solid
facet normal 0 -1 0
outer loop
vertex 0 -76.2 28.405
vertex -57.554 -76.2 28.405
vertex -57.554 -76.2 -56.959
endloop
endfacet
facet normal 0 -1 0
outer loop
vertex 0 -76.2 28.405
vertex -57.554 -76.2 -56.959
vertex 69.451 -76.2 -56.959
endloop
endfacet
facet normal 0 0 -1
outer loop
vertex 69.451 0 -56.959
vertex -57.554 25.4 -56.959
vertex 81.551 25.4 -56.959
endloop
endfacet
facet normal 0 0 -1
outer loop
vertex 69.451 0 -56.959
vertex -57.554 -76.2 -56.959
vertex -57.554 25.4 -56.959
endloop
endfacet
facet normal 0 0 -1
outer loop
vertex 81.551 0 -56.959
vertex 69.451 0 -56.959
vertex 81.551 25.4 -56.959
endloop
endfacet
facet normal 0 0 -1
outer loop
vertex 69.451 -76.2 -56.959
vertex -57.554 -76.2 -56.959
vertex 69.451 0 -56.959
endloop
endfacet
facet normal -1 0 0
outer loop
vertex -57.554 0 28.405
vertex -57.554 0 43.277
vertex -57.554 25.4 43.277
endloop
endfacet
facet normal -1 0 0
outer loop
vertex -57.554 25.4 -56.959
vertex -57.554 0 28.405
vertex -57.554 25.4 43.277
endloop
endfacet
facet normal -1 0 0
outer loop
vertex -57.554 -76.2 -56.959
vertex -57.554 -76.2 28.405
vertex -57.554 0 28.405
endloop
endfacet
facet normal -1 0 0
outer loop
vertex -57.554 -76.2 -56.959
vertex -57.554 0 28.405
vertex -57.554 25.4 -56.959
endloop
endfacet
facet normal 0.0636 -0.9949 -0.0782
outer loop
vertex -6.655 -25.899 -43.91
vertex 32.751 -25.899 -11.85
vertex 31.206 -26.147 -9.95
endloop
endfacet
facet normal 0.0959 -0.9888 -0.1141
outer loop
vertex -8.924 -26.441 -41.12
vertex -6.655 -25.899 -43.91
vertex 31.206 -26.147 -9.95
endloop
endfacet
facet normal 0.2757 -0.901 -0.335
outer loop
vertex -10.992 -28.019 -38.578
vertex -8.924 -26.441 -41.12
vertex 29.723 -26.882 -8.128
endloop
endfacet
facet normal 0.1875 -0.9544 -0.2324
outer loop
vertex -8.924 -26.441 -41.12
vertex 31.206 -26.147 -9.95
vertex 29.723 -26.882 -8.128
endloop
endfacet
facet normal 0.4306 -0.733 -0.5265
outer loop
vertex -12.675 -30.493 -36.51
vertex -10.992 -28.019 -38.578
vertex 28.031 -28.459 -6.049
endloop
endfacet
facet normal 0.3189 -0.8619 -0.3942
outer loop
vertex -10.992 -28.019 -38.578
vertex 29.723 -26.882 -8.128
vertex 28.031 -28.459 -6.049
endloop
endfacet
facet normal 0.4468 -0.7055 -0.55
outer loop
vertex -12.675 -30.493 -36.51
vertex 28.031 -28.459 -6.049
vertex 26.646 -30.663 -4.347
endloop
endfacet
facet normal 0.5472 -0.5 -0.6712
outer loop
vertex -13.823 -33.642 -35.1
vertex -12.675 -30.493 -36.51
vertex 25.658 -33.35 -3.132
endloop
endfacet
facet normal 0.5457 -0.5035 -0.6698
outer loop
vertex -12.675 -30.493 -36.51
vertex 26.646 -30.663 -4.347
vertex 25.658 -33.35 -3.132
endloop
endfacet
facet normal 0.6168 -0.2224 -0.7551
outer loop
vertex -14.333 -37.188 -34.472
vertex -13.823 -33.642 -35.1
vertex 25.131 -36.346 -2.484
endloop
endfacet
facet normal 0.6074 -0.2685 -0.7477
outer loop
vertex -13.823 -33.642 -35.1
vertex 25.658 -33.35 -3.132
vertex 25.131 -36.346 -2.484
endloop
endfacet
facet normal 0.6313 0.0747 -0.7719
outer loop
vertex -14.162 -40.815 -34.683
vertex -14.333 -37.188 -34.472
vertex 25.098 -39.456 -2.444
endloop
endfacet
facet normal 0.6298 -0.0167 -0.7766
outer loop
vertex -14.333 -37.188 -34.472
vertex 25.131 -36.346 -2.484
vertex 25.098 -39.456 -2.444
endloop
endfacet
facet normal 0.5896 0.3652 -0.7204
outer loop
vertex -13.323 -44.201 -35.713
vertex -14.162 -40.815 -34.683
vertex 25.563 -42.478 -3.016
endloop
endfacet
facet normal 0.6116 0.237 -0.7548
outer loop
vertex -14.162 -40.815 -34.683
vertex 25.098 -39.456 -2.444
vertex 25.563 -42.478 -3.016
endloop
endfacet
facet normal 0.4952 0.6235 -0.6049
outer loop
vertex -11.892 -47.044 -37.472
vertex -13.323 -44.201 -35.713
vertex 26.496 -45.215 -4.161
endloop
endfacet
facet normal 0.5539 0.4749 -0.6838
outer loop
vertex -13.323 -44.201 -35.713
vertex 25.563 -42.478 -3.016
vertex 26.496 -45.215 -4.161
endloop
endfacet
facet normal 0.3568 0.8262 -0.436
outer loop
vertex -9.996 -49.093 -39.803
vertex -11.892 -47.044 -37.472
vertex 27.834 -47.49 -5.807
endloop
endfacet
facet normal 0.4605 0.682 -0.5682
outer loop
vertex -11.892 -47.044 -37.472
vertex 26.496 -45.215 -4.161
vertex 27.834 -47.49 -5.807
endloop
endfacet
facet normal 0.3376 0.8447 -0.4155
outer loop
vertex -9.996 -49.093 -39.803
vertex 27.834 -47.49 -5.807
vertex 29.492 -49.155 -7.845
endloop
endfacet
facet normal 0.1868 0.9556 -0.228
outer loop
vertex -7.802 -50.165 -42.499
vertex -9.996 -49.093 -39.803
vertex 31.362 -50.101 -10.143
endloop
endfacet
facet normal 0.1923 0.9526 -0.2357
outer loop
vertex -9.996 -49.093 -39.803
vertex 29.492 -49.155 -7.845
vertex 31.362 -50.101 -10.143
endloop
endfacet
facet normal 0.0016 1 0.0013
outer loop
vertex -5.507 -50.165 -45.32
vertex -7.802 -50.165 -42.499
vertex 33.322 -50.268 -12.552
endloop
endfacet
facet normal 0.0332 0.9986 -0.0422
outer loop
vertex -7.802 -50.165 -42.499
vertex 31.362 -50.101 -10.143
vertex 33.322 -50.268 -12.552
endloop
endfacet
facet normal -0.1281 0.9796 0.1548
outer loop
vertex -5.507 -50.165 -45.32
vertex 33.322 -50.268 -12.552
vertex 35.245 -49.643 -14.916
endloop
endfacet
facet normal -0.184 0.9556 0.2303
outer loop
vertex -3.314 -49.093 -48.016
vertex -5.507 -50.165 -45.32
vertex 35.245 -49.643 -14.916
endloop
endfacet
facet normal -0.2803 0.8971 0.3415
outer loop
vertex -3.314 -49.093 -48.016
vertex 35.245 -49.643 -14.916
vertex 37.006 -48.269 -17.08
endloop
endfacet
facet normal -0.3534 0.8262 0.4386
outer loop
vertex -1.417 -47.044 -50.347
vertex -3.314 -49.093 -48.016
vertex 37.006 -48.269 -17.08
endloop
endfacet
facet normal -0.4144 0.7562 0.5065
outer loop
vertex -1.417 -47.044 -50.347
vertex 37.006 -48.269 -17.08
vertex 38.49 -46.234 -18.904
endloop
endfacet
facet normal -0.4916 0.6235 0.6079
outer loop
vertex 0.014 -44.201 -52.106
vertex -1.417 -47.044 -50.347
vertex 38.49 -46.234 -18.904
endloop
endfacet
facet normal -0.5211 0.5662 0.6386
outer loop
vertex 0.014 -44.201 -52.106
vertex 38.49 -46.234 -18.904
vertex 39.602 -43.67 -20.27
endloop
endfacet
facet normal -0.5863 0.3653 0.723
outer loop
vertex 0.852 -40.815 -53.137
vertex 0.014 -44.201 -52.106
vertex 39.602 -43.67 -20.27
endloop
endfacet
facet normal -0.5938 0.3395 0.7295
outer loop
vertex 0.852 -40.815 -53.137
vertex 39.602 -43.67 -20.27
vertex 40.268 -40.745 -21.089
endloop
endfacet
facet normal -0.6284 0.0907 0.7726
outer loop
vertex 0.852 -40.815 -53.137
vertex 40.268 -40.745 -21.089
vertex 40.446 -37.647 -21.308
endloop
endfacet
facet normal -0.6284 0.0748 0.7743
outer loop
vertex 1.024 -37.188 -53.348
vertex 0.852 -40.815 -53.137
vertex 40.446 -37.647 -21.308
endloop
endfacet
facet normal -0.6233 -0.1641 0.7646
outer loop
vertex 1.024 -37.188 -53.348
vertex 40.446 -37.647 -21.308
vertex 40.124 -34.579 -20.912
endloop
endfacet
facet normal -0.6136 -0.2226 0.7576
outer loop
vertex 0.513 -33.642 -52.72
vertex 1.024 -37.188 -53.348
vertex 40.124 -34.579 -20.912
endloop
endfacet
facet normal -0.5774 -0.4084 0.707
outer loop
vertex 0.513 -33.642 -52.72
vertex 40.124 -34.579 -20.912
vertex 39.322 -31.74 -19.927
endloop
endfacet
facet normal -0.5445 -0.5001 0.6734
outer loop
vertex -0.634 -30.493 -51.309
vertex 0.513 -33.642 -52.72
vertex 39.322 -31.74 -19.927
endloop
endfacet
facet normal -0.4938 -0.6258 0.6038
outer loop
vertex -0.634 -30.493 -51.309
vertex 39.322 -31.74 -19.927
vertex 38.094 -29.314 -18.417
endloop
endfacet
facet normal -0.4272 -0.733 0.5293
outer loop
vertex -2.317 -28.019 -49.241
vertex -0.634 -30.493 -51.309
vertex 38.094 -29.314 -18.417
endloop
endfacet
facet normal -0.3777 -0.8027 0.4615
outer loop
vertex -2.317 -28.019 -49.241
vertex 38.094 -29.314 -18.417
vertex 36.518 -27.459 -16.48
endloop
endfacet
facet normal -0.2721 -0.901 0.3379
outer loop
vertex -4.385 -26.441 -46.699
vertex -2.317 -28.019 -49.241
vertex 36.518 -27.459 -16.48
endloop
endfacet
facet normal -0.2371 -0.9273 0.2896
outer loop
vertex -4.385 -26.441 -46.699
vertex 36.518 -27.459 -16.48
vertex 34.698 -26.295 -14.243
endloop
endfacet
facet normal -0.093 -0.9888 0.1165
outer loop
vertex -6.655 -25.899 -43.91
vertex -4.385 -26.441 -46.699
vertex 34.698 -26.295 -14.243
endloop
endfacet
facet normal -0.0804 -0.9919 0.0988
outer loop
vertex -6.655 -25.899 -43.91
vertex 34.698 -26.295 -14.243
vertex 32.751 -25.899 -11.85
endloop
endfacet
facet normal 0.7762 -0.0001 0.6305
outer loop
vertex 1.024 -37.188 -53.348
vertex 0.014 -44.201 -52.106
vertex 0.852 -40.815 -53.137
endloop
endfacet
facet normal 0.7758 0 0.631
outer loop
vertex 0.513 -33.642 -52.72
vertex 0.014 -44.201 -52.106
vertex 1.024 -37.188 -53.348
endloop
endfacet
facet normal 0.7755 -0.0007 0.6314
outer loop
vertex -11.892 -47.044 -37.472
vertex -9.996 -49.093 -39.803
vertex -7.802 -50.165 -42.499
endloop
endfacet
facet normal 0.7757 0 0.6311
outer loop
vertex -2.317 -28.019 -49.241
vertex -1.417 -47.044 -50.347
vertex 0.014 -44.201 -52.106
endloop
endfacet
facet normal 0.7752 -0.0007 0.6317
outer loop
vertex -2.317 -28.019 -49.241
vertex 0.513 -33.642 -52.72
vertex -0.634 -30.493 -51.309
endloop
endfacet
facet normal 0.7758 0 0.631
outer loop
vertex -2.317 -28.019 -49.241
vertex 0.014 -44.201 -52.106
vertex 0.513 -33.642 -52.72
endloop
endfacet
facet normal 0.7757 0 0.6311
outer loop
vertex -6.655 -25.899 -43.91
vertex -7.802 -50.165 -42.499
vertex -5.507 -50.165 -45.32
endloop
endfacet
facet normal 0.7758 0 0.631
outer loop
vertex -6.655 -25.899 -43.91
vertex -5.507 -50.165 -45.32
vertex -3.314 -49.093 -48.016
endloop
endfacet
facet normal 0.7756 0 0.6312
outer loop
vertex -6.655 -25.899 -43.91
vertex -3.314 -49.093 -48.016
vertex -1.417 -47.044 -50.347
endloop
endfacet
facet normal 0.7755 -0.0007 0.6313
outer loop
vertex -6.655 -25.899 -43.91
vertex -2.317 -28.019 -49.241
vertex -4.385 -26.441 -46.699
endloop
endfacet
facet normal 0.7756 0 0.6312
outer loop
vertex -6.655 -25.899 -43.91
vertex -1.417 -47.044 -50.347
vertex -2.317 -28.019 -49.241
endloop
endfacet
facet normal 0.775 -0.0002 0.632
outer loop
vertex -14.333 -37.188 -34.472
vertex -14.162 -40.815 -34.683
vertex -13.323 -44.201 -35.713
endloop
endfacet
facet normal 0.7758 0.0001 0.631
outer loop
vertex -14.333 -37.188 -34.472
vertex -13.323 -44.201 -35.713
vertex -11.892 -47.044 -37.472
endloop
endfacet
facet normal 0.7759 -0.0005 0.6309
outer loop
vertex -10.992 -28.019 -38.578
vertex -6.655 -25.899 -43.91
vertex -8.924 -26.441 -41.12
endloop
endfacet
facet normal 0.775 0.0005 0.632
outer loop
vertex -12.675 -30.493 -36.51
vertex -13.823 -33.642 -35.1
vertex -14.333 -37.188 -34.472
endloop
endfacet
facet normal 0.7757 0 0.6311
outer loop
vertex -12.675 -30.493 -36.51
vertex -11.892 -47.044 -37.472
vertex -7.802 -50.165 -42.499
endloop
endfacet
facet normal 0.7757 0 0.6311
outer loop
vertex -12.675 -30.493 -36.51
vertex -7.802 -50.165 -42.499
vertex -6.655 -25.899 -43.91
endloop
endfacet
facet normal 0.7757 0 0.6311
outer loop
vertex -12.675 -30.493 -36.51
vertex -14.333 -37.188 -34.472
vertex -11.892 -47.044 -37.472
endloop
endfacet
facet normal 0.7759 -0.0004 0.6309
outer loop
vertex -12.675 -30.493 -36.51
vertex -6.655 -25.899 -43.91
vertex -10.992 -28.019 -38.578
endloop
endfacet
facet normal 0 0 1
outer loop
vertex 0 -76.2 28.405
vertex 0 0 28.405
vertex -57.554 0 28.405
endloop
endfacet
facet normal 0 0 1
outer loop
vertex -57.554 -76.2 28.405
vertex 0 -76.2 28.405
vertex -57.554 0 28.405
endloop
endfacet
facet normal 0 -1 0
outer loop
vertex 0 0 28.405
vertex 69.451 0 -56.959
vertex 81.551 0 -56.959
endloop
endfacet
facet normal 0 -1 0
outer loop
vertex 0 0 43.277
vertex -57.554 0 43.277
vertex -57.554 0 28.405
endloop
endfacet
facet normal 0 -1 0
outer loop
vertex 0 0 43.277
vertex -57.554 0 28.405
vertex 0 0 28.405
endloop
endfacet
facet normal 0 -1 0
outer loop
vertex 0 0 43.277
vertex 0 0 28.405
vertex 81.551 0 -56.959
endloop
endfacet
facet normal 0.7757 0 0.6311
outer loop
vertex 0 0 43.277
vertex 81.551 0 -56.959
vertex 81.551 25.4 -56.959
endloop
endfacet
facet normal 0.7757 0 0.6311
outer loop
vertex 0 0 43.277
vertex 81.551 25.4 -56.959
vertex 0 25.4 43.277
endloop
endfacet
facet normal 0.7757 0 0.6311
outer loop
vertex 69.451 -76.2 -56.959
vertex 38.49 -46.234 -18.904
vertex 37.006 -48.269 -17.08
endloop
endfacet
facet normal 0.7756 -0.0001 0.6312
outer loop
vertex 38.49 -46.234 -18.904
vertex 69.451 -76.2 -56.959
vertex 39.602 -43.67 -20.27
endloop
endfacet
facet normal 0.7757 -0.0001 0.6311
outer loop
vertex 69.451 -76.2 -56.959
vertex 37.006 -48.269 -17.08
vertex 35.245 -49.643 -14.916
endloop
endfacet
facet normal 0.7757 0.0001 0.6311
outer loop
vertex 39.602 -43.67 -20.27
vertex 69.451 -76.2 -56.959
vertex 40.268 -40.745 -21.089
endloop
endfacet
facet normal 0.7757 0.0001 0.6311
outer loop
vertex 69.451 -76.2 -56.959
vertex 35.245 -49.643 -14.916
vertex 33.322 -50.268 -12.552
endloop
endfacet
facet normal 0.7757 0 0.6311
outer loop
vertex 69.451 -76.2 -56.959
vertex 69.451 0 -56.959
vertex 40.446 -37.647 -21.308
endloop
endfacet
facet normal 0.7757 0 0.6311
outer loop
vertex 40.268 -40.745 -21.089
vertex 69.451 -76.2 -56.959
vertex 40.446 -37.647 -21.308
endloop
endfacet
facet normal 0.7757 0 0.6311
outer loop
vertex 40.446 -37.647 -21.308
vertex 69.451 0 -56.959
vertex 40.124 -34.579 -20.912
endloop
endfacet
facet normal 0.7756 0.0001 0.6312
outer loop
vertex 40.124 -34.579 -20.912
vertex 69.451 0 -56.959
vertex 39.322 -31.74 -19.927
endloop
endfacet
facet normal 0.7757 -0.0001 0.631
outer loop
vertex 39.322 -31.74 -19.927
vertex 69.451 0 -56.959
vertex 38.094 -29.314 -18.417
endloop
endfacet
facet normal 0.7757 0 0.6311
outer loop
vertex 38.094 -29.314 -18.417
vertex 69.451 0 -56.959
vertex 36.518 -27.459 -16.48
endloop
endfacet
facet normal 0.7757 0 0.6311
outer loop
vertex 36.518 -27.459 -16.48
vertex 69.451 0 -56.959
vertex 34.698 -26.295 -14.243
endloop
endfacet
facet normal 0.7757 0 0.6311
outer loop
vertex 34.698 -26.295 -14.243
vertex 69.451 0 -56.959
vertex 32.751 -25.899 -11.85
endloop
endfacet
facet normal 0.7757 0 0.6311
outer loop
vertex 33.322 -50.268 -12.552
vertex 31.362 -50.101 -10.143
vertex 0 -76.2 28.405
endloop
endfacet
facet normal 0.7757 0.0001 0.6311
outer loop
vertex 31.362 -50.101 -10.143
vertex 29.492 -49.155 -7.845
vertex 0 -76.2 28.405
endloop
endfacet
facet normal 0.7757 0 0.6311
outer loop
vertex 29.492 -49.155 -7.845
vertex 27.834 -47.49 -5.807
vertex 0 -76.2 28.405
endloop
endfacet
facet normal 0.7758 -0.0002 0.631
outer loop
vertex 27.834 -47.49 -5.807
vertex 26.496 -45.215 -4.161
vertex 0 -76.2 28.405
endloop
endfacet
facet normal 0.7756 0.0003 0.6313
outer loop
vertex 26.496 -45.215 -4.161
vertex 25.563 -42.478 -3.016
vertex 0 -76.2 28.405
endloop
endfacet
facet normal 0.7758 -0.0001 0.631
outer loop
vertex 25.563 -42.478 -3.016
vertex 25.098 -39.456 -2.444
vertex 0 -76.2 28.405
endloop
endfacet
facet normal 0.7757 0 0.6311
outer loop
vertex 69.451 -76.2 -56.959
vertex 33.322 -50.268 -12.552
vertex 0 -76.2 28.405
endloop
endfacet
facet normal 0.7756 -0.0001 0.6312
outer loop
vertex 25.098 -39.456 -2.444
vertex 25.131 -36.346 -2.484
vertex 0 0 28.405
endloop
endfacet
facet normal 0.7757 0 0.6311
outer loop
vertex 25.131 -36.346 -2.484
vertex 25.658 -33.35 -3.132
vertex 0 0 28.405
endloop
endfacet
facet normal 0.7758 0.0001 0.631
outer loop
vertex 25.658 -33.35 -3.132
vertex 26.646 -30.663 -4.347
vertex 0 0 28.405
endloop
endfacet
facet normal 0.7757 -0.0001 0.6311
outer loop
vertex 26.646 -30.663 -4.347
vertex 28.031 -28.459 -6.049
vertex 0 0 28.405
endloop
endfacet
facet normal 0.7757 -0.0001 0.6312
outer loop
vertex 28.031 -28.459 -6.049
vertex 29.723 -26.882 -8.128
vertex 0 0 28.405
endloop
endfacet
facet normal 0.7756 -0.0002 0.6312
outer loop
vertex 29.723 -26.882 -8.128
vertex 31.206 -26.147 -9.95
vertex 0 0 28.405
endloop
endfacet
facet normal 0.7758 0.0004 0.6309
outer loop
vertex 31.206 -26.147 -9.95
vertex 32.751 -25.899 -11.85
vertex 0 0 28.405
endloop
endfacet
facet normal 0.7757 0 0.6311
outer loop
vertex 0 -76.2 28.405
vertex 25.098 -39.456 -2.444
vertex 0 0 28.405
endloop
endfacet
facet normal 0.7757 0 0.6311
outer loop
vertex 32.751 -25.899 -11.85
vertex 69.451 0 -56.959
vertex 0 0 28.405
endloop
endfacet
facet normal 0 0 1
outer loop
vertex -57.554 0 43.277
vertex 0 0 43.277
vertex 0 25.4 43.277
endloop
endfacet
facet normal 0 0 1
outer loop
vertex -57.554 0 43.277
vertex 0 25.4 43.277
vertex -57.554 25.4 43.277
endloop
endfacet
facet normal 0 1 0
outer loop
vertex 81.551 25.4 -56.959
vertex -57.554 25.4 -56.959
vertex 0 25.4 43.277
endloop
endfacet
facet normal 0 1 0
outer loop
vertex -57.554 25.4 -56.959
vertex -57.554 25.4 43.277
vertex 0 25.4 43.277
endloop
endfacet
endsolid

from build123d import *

# Parameters (mm, degrees)
F1_DEPTH = 76.2
F2_DEPTH = 25.4
F3_R     = 12.201191
F4_DEPTH = 50.8


with BuildPart() as f1:
    # F0 (on Front) → F1 (new body)
    with BuildSketch(Plane.XZ):
        Polygon((69.451064, -56.958791), (0, 28.405037), (-57.55366, 28.405037), (-57.55366, -56.958791), align=None)
    extrude(amount=F1_DEPTH)

    # F0 (on Front) → F2 (join)
    with BuildSketch(Plane.XZ):
        Polygon((69.451064, -56.958791), (0, 28.405037), (-57.55366, 28.405037), (-57.55366, -56.958791), align=None)
        Polygon((-57.55366, 28.405037), (0, 28.405037), (69.451064, -56.958791), (81.550552, -56.958791), (0, 43.276783), (-57.55366, 43.276783), align=None)
    extrude(amount=-F2_DEPTH)

    # F3 (on face) → F4 (cut)
    with BuildSketch(Plane(origin=(13.905559, 0, 11.313409), x_dir=(0, 1, 0), z_dir=(0.7757, 0, 0.631101))):
        with Locations((-38.1, -29.861083)):
            Circle(F3_R)
    extrude(amount=-F4_DEPTH, mode=Mode.SUBTRACT)


solid = f1.part
